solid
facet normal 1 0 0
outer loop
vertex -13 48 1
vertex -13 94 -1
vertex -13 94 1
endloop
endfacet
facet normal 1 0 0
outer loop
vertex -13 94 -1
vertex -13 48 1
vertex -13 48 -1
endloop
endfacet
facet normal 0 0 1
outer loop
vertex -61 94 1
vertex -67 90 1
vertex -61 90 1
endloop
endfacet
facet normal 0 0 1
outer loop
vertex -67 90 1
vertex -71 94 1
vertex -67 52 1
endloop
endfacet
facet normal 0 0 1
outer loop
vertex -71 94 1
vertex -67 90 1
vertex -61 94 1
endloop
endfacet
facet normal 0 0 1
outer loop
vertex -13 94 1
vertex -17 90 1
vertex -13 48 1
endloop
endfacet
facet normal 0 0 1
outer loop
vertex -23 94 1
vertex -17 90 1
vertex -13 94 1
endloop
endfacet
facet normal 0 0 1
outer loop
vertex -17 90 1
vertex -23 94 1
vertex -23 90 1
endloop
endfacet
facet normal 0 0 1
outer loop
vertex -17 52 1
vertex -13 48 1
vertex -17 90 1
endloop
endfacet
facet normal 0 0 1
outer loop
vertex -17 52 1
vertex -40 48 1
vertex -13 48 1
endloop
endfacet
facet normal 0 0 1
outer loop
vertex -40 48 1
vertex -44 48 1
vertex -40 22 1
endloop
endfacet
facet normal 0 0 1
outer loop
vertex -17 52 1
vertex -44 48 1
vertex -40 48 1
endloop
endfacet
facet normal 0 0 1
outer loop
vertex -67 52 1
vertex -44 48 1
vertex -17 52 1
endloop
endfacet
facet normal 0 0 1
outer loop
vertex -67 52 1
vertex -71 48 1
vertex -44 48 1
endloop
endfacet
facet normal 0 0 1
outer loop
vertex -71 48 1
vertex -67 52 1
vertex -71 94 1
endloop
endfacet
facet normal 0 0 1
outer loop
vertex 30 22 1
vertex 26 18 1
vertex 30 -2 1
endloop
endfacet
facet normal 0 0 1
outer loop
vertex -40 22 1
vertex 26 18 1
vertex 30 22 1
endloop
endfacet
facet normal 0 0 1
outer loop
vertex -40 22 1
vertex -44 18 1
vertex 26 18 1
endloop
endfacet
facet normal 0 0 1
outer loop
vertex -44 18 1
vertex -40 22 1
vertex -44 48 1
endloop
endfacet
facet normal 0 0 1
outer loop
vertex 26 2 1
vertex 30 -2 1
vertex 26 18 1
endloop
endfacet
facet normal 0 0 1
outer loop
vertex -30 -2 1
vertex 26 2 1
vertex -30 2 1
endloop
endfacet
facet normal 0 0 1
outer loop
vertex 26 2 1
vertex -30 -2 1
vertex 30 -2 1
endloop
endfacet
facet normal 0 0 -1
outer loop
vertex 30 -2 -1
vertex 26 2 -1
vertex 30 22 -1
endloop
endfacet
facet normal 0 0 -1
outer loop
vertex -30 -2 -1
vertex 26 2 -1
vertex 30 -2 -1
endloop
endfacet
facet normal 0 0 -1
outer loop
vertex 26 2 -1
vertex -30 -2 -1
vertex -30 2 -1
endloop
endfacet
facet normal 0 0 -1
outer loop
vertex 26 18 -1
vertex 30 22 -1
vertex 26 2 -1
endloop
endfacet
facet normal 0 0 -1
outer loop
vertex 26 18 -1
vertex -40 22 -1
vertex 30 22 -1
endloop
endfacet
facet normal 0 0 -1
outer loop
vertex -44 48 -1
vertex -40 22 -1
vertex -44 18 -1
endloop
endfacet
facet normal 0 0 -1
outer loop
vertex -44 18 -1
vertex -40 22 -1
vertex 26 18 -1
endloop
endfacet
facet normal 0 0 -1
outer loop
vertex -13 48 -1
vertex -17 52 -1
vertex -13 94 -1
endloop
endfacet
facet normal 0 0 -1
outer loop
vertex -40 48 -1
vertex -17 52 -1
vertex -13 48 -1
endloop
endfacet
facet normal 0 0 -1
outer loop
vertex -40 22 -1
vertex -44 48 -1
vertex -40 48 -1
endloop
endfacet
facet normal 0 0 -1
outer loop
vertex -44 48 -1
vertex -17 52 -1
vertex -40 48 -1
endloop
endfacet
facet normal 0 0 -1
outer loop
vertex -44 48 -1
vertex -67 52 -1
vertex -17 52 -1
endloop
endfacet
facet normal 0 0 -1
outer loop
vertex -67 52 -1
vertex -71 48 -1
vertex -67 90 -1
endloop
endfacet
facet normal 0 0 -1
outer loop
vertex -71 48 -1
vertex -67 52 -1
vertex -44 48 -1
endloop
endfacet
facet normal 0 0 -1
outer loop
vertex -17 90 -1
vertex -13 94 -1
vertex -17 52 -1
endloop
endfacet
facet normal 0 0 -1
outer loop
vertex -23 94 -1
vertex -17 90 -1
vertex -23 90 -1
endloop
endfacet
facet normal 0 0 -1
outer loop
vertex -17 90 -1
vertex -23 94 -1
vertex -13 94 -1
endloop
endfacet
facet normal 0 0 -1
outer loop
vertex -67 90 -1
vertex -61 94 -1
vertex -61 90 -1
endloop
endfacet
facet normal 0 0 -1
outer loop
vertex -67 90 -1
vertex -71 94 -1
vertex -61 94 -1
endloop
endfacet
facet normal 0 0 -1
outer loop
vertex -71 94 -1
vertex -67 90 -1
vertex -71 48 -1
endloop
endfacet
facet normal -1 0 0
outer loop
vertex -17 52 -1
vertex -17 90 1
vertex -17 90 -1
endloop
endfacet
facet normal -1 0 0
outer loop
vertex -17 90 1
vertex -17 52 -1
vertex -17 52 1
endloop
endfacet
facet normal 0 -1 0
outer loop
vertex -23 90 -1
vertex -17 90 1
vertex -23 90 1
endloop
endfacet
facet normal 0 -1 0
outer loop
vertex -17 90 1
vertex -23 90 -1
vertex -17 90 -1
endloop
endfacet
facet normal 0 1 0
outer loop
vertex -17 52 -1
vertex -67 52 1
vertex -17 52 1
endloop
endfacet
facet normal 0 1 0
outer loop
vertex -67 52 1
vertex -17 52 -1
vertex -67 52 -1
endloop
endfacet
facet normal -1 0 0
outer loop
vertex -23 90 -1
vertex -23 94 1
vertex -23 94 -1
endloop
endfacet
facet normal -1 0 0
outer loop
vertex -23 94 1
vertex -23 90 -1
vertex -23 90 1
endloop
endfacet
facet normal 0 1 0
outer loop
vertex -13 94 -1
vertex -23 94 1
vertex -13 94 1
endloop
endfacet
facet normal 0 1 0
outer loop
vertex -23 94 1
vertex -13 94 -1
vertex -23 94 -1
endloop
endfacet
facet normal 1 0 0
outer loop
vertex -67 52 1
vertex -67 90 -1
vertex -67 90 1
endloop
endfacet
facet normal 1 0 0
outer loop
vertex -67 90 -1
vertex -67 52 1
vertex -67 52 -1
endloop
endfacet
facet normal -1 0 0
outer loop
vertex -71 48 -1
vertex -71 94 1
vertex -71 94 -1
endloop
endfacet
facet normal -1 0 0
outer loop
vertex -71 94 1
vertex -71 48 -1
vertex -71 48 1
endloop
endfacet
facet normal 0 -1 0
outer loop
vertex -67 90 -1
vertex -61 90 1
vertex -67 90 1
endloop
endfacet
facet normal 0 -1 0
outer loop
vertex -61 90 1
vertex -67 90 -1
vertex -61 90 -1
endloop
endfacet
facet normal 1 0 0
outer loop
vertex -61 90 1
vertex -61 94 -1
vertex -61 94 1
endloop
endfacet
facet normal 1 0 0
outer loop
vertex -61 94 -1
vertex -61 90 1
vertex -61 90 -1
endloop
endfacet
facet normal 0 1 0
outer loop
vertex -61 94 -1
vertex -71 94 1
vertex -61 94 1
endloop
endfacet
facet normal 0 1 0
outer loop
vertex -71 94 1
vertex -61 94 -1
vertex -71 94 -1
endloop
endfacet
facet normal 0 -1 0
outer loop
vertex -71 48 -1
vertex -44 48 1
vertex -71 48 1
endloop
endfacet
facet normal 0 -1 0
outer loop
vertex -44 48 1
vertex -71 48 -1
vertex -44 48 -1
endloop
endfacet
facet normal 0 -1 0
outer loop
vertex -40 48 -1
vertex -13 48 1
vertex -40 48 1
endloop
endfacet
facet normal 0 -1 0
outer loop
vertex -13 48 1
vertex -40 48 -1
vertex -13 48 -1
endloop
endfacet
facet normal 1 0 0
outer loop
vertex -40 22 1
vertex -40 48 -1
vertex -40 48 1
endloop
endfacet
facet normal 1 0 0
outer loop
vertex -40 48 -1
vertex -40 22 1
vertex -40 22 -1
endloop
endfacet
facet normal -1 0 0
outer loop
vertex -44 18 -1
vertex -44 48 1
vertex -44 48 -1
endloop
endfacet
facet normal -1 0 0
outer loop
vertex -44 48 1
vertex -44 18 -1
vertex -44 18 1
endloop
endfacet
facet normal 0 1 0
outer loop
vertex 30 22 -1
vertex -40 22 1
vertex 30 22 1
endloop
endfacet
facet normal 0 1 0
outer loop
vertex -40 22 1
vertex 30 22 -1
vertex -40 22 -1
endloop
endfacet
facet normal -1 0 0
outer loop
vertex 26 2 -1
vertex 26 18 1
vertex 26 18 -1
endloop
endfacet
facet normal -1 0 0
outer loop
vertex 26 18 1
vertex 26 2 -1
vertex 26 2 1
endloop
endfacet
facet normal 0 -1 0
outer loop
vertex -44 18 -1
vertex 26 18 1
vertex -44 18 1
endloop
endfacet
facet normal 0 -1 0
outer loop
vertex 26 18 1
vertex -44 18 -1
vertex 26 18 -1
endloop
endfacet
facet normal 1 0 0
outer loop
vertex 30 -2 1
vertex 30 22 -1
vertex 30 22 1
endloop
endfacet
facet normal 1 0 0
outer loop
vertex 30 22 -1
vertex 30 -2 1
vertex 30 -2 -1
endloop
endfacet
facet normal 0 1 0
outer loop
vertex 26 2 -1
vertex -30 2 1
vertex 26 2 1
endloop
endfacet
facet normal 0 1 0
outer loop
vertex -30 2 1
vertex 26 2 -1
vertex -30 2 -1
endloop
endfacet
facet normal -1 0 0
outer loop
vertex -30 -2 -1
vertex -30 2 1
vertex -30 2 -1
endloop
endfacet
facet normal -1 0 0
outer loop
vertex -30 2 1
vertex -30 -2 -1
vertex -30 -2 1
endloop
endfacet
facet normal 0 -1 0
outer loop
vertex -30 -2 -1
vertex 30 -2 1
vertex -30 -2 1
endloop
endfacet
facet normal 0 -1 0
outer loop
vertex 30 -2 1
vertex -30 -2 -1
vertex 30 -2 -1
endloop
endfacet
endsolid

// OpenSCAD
Width = 4;
HoldLength = 60;
Height = 2;

LowHeight = 20;

bottomHoldLength = 70;

hangerHeight = 26;

stripWidth = 58;
stripHeight = 38;
stripHolderLength = 10;

union() {
    cube([HoldLength, Width, Height], center = true);

    translate([HoldLength / 2 - Width / 2, LowHeight / 2 + Width / 2, 0]) {
        cube([Width, LowHeight, Height], center = true);

        translate([-(bottomHoldLength / 2 + Width / 2), LowHeight / 2 - Width / 2, 0]) {
            cube([bottomHoldLength, Width, Height], center = true);
            
            translate([-(bottomHoldLength / 2 - Width / 2), hangerHeight / 2 + Width / 2, 0]) {
                cube([Width, hangerHeight, Height], center = true);
                
                translate([0, (hangerHeight / 2 + Width / 2), 0]) {
                    cube([stripWidth, Width, Height], center = true);

                    translate([(stripWidth / 2 - Width / 2), (stripHeight / 2 + Width / 2), 0]) {
                        cube([Width, stripHeight, Height], center = true);
                        
                        translate([-(stripHolderLength / 2 - Width / 2), stripHeight / 2 + Width / 2, 0]) {
                            cube([stripHolderLength, Width, Height], center = true);
                        }
                    }

                    translate([-(stripWidth / 2 - Width / 2), (stripHeight / 2 + Width / 2), 0]) {
                        cube([Width, stripHeight, Height], center = true);
                        
                        translate([(stripHolderLength / 2 - Width / 2), stripHeight / 2 + Width / 2, 0]) {
                            cube([stripHolderLength, Width, Height], center = true);
                        }
                    }
                }
            }
        }
    }
}
